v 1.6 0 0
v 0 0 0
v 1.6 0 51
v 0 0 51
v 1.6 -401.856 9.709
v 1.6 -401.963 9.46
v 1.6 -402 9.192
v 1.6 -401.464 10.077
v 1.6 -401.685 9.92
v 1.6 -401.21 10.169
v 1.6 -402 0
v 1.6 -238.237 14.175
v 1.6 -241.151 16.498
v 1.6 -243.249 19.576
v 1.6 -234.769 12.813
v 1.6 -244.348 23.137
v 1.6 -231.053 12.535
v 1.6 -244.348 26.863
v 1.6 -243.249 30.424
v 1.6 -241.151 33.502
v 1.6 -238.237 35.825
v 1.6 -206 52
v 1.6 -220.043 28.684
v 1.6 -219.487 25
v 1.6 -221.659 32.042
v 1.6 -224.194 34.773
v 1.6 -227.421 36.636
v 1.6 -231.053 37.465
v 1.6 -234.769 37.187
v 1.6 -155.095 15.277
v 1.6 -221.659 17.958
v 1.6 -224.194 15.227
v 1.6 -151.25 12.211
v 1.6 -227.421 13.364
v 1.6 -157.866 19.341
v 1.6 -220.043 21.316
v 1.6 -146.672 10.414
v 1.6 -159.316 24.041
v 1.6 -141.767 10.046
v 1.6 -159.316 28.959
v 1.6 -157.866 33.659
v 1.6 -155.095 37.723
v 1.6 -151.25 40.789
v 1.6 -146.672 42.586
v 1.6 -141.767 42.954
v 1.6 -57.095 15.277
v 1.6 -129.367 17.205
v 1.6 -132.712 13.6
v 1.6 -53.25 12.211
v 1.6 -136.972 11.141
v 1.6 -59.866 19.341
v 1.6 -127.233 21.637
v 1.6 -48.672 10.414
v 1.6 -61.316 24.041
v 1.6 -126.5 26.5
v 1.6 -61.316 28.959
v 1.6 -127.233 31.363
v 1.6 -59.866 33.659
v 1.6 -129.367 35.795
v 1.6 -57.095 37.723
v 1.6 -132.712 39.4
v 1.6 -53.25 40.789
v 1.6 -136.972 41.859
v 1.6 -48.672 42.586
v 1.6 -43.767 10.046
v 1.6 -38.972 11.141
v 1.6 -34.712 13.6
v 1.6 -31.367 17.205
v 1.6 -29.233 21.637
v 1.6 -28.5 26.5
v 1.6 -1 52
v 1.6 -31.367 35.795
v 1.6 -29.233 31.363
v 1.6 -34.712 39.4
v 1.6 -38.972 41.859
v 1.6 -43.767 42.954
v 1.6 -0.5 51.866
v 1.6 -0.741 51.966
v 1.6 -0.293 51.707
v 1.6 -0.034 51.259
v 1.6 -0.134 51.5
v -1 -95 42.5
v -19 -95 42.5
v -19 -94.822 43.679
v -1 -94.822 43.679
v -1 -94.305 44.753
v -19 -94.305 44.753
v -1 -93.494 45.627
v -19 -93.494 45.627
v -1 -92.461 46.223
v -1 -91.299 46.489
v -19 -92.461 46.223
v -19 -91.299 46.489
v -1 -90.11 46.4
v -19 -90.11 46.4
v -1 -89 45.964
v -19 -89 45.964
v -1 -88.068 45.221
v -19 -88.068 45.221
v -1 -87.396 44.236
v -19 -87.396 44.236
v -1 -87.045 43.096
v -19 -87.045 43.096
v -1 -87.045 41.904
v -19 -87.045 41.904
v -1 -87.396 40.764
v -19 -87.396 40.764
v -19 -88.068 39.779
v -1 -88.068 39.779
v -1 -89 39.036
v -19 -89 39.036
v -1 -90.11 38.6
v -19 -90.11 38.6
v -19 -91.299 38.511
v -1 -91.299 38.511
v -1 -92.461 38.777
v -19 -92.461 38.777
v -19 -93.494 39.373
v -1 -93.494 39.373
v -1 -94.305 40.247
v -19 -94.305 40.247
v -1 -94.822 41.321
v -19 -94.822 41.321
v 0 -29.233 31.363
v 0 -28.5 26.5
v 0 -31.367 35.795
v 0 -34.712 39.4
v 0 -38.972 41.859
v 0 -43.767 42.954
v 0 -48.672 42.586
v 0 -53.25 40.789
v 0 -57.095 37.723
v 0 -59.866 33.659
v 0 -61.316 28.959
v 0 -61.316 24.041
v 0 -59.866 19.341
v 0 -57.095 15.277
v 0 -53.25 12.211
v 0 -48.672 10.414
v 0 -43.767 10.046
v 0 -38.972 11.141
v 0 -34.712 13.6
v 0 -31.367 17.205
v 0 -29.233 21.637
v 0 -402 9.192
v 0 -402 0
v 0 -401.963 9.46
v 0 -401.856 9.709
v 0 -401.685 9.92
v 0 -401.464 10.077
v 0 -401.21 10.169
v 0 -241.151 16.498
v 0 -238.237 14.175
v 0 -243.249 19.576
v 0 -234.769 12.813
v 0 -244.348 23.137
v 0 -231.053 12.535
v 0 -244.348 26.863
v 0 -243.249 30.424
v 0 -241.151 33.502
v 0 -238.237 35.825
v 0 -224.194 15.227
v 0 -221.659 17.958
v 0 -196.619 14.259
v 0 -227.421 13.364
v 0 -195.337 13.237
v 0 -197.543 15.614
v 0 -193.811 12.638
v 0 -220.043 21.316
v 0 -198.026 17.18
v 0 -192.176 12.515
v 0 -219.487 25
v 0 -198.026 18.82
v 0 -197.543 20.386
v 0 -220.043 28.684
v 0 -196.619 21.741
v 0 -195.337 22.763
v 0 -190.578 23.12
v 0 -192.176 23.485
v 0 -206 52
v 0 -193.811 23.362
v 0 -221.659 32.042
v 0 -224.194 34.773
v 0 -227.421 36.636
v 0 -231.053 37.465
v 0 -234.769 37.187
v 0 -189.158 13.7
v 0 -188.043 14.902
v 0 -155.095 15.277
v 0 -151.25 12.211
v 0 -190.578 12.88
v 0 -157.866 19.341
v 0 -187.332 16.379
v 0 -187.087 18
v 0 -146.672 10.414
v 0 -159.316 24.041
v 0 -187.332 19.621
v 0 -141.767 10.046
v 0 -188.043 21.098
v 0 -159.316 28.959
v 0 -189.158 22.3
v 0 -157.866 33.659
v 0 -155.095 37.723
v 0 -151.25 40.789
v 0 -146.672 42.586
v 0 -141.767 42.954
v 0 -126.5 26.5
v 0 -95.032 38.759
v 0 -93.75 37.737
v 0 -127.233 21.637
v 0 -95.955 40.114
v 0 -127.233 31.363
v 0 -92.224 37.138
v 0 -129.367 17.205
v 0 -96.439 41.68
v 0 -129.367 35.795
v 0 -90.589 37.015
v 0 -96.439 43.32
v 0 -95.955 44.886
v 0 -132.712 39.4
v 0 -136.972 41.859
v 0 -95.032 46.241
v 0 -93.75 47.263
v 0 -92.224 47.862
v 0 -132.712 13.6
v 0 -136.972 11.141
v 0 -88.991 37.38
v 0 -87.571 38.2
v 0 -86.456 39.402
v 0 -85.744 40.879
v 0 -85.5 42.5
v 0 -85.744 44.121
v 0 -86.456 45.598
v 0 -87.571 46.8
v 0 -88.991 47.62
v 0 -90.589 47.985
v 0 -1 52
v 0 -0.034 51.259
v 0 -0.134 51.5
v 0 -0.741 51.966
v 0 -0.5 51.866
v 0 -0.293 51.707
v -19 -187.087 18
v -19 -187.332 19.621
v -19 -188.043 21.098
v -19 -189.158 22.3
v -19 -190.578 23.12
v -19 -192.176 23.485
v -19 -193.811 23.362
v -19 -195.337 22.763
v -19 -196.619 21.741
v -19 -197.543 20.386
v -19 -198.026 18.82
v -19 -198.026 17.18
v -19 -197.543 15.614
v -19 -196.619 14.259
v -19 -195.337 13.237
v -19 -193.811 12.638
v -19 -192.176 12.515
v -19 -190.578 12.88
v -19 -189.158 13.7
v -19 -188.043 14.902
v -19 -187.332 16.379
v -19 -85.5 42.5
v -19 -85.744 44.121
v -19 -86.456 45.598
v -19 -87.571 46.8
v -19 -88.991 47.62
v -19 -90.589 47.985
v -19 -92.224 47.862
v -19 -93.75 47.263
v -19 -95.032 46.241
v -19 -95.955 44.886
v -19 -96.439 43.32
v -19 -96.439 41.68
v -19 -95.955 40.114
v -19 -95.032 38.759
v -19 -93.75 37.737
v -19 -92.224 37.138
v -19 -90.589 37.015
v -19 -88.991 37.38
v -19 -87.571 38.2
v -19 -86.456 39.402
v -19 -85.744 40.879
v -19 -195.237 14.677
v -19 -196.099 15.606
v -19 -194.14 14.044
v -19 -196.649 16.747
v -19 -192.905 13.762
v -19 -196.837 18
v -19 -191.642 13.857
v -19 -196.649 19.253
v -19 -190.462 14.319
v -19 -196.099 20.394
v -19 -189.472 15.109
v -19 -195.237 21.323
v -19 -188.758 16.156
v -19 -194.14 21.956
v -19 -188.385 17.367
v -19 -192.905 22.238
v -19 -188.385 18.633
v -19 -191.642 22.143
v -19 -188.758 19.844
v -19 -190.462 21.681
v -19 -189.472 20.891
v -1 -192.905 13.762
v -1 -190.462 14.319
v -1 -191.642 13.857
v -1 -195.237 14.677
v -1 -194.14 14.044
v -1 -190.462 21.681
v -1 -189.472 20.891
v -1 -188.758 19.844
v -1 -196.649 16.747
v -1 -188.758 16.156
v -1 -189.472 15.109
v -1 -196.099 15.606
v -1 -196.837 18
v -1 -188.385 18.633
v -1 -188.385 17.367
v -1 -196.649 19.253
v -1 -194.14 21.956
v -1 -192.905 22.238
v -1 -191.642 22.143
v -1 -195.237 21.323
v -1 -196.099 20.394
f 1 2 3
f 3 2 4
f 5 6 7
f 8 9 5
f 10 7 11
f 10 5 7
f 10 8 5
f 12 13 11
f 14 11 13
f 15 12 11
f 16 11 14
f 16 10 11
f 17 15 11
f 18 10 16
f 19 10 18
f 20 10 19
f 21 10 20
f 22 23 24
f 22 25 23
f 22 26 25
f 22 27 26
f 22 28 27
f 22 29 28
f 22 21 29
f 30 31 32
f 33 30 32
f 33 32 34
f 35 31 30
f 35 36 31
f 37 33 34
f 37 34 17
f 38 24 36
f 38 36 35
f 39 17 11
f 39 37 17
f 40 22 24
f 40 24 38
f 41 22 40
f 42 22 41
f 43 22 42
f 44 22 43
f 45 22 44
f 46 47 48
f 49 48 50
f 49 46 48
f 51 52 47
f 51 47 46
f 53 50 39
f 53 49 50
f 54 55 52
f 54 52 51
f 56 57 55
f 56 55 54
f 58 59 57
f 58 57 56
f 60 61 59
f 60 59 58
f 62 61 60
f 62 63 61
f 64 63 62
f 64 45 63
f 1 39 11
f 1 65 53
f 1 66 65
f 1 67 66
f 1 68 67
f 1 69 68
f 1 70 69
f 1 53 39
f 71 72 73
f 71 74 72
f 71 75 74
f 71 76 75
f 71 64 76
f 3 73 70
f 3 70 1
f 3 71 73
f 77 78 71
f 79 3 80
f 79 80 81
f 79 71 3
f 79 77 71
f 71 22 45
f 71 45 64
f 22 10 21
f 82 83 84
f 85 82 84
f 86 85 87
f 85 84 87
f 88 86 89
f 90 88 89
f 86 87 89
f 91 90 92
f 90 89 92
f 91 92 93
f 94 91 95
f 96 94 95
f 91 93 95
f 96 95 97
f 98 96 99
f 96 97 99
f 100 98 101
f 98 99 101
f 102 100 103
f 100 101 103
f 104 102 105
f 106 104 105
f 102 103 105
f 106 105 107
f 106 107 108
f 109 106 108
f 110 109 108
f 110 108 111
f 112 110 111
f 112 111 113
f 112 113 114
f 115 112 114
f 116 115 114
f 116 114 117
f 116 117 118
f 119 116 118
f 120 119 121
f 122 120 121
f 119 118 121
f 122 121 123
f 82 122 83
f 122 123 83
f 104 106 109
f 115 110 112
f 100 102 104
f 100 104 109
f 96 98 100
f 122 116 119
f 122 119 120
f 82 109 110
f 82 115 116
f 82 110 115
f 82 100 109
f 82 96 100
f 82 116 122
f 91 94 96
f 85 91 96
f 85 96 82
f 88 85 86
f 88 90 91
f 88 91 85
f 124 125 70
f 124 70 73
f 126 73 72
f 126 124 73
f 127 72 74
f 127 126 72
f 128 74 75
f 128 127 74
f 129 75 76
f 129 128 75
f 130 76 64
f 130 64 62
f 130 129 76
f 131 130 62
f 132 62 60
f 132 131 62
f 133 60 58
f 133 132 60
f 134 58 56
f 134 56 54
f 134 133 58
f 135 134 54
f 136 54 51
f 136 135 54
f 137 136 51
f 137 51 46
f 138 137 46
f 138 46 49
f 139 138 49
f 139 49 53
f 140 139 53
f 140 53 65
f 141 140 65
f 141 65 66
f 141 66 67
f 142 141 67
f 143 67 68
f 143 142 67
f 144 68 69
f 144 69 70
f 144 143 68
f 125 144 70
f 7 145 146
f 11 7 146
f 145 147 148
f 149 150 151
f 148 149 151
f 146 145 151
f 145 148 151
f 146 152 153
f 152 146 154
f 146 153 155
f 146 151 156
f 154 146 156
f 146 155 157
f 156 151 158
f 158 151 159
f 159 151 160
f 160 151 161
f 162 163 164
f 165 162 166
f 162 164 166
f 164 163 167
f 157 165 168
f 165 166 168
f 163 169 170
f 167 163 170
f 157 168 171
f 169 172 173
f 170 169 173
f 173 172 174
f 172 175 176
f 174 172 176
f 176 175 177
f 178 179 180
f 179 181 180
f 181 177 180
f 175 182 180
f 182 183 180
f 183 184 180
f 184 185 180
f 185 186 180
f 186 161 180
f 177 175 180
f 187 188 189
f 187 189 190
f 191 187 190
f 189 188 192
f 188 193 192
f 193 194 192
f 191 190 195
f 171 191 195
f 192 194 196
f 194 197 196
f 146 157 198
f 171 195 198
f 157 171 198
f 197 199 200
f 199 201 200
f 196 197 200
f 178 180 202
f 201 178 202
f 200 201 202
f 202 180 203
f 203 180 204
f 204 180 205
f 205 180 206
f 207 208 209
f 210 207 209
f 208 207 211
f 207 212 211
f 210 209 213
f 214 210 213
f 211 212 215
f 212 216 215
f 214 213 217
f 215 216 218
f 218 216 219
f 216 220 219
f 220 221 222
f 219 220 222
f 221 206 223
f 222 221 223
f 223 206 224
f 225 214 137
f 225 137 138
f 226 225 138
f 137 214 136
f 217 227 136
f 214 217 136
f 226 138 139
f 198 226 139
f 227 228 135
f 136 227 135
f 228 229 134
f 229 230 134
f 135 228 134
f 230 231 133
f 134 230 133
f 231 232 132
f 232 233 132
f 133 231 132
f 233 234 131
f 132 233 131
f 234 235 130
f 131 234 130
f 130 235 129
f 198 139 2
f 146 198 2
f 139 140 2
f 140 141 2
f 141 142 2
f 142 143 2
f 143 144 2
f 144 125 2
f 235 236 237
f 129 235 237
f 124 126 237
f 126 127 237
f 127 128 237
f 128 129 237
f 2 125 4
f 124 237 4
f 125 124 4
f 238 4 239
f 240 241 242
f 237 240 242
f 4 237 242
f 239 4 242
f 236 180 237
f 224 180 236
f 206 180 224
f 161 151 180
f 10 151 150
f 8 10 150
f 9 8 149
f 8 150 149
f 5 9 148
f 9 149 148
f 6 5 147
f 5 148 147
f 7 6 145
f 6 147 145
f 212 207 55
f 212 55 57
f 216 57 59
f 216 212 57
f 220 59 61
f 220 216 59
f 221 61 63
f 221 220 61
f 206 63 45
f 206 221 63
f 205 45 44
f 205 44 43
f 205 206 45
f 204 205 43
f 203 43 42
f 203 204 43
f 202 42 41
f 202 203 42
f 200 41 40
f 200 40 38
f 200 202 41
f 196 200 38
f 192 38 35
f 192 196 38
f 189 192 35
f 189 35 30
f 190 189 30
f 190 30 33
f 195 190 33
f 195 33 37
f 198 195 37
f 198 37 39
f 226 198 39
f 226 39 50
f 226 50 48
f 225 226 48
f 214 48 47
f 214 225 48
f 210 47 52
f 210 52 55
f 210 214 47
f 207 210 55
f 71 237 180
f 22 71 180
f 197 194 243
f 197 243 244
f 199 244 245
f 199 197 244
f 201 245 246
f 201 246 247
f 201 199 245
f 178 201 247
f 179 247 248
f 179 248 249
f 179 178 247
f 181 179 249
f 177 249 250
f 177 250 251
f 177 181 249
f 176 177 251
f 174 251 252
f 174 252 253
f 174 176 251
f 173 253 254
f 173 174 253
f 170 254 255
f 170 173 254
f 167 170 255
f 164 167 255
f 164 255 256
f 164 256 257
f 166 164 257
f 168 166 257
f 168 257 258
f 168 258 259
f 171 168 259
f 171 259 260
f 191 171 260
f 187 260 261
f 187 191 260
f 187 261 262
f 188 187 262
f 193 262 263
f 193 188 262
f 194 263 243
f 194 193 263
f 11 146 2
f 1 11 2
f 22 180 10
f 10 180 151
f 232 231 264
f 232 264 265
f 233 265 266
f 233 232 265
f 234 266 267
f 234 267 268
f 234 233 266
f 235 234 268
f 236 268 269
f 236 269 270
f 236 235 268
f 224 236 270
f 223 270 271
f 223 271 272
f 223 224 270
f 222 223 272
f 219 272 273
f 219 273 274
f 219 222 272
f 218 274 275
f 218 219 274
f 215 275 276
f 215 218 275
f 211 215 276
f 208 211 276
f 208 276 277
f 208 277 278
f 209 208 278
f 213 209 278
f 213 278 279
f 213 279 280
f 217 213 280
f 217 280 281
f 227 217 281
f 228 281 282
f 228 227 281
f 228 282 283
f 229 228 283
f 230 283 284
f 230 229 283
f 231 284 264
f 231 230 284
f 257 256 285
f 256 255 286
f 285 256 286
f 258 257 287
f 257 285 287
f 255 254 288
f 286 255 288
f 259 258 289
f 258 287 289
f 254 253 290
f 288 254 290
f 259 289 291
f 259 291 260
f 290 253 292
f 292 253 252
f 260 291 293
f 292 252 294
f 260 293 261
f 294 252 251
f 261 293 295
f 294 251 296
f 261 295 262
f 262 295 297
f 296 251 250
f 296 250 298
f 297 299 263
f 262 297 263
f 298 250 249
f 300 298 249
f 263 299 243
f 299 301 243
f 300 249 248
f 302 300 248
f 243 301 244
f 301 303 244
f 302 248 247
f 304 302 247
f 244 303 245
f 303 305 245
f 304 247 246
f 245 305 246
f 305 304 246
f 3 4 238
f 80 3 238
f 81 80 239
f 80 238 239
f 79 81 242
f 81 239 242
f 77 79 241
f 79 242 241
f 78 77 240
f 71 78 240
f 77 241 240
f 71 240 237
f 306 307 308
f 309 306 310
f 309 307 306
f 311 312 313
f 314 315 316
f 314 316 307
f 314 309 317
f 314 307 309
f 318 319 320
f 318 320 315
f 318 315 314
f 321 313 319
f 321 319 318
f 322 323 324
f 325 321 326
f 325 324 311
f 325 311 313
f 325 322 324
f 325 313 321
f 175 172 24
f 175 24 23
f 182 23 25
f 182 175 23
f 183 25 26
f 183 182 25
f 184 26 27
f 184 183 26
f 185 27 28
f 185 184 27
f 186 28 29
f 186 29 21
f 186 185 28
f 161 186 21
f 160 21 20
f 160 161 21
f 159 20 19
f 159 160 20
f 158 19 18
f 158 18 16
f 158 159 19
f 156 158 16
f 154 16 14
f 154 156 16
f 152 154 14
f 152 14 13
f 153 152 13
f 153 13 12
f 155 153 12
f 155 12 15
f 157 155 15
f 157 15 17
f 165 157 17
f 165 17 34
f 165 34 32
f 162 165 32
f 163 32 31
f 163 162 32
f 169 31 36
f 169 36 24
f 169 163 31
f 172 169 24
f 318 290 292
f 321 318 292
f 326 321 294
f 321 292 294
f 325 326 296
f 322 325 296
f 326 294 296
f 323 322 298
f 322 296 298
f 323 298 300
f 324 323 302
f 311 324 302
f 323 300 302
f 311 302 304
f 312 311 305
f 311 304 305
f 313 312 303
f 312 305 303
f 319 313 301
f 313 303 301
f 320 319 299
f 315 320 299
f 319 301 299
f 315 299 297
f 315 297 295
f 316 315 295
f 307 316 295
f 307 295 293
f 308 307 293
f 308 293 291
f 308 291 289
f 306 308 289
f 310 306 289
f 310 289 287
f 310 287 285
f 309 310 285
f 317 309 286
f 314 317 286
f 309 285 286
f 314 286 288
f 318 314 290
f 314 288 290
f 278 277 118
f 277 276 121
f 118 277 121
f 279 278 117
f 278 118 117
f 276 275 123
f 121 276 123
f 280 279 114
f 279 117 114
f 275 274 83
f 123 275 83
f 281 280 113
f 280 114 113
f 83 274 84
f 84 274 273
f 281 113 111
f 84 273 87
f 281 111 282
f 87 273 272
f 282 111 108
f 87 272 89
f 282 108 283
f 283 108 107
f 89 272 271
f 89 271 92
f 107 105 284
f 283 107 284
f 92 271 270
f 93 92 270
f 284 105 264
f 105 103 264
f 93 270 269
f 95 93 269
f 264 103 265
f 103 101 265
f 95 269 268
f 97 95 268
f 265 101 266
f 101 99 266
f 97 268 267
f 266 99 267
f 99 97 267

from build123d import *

# Parameters (mm, degrees)
F0_R          = 12.5
F0_R_2        = 5.5
F0_R_3        = 16.5
F1_DEPTH      = 1.6
F0_R_4        = 4.25
F2_DEPTH      = 19
F2_DEPTH_BACK = 1.6
F3_R          = 4
F4_DEPTH      = 18
F5_R          = 4.25
F6_DEPTH      = 18


with BuildPart() as f1:
    # F0 (on Right) → F1 (new body)
    with BuildSketch(Plane.YZ):
        with BuildLine():
            Line((-402, 0), (0, 0))
            Line((0, 0), (0, 51))
            ThreePointArc((0, 51), (-0.2928932188, 51.7071067812), (-1, 52))
            Line((-1, 52), (-206, 52))
            Line((-206, 52), (-401.2095290887, 10.1693866238))
            ThreePointArc((-401.2095290887, 10.1693866238), (-401.777666088, 9.8202617548), (-402, 9.1915842098))
            Line((-402, 9.1915842098), (-402, 0))
        make_face()
        with Locations((-231.9873586528, 25)):
            Circle(F0_R, mode=Mode.SUBTRACT)
        with Locations((-192.5874, 18)):
            Circle(F0_R_2, mode=Mode.SUBTRACT)
        with Locations((-143, 26.5)):
            Circle(F0_R_3, mode=Mode.SUBTRACT)
        with Locations((-45, 26.5)):
            Circle(F0_R_3, mode=Mode.SUBTRACT)
        with Locations((-91, 42.5)):
            Circle(F0_R_2, mode=Mode.SUBTRACT)
    extrude(amount=F1_DEPTH)

    # F0 (on Right) → F2 (join, two sides)
    with BuildSketch(Plane.YZ) as f2_sk:
        with Locations((-91, 42.5)):
            Circle(F0_R_2)
        with Locations((-91, 42.5)):
            Circle(F0_R_4, mode=Mode.SUBTRACT)
        with Locations((-192.5874, 18)):
            Circle(F0_R_2)
        with Locations((-192.5874, 18)):
            Circle(F0_R_4, mode=Mode.SUBTRACT)
        with Locations((-91, 42.5)):
            Circle(F0_R_4)
        with Locations((-192.5874, 18)):
            Circle(F0_R_4)
    extrude(amount=-F2_DEPTH)
    extrude(f2_sk.sketch, amount=F2_DEPTH_BACK)

    # F3 (on face) → F4 (cut)
    with BuildSketch(Plane(origin=(-19, 0, 0), x_dir=(0, -1, 0), z_dir=(-1, 0, 0))):
        with Locations((91, 42.5)):
            Circle(F3_R)
    extrude(amount=-F4_DEPTH, mode=Mode.SUBTRACT)

    # F5 (on face) → F6 (cut)
    with BuildSketch(Plane(origin=(-19, 0, 0), x_dir=(0, -1, 0), z_dir=(-1, 0, 0))):
        with Locations((192.5874, 18)):
            Circle(F5_R)
    extrude(amount=-F6_DEPTH, mode=Mode.SUBTRACT)


solid = f1.part
